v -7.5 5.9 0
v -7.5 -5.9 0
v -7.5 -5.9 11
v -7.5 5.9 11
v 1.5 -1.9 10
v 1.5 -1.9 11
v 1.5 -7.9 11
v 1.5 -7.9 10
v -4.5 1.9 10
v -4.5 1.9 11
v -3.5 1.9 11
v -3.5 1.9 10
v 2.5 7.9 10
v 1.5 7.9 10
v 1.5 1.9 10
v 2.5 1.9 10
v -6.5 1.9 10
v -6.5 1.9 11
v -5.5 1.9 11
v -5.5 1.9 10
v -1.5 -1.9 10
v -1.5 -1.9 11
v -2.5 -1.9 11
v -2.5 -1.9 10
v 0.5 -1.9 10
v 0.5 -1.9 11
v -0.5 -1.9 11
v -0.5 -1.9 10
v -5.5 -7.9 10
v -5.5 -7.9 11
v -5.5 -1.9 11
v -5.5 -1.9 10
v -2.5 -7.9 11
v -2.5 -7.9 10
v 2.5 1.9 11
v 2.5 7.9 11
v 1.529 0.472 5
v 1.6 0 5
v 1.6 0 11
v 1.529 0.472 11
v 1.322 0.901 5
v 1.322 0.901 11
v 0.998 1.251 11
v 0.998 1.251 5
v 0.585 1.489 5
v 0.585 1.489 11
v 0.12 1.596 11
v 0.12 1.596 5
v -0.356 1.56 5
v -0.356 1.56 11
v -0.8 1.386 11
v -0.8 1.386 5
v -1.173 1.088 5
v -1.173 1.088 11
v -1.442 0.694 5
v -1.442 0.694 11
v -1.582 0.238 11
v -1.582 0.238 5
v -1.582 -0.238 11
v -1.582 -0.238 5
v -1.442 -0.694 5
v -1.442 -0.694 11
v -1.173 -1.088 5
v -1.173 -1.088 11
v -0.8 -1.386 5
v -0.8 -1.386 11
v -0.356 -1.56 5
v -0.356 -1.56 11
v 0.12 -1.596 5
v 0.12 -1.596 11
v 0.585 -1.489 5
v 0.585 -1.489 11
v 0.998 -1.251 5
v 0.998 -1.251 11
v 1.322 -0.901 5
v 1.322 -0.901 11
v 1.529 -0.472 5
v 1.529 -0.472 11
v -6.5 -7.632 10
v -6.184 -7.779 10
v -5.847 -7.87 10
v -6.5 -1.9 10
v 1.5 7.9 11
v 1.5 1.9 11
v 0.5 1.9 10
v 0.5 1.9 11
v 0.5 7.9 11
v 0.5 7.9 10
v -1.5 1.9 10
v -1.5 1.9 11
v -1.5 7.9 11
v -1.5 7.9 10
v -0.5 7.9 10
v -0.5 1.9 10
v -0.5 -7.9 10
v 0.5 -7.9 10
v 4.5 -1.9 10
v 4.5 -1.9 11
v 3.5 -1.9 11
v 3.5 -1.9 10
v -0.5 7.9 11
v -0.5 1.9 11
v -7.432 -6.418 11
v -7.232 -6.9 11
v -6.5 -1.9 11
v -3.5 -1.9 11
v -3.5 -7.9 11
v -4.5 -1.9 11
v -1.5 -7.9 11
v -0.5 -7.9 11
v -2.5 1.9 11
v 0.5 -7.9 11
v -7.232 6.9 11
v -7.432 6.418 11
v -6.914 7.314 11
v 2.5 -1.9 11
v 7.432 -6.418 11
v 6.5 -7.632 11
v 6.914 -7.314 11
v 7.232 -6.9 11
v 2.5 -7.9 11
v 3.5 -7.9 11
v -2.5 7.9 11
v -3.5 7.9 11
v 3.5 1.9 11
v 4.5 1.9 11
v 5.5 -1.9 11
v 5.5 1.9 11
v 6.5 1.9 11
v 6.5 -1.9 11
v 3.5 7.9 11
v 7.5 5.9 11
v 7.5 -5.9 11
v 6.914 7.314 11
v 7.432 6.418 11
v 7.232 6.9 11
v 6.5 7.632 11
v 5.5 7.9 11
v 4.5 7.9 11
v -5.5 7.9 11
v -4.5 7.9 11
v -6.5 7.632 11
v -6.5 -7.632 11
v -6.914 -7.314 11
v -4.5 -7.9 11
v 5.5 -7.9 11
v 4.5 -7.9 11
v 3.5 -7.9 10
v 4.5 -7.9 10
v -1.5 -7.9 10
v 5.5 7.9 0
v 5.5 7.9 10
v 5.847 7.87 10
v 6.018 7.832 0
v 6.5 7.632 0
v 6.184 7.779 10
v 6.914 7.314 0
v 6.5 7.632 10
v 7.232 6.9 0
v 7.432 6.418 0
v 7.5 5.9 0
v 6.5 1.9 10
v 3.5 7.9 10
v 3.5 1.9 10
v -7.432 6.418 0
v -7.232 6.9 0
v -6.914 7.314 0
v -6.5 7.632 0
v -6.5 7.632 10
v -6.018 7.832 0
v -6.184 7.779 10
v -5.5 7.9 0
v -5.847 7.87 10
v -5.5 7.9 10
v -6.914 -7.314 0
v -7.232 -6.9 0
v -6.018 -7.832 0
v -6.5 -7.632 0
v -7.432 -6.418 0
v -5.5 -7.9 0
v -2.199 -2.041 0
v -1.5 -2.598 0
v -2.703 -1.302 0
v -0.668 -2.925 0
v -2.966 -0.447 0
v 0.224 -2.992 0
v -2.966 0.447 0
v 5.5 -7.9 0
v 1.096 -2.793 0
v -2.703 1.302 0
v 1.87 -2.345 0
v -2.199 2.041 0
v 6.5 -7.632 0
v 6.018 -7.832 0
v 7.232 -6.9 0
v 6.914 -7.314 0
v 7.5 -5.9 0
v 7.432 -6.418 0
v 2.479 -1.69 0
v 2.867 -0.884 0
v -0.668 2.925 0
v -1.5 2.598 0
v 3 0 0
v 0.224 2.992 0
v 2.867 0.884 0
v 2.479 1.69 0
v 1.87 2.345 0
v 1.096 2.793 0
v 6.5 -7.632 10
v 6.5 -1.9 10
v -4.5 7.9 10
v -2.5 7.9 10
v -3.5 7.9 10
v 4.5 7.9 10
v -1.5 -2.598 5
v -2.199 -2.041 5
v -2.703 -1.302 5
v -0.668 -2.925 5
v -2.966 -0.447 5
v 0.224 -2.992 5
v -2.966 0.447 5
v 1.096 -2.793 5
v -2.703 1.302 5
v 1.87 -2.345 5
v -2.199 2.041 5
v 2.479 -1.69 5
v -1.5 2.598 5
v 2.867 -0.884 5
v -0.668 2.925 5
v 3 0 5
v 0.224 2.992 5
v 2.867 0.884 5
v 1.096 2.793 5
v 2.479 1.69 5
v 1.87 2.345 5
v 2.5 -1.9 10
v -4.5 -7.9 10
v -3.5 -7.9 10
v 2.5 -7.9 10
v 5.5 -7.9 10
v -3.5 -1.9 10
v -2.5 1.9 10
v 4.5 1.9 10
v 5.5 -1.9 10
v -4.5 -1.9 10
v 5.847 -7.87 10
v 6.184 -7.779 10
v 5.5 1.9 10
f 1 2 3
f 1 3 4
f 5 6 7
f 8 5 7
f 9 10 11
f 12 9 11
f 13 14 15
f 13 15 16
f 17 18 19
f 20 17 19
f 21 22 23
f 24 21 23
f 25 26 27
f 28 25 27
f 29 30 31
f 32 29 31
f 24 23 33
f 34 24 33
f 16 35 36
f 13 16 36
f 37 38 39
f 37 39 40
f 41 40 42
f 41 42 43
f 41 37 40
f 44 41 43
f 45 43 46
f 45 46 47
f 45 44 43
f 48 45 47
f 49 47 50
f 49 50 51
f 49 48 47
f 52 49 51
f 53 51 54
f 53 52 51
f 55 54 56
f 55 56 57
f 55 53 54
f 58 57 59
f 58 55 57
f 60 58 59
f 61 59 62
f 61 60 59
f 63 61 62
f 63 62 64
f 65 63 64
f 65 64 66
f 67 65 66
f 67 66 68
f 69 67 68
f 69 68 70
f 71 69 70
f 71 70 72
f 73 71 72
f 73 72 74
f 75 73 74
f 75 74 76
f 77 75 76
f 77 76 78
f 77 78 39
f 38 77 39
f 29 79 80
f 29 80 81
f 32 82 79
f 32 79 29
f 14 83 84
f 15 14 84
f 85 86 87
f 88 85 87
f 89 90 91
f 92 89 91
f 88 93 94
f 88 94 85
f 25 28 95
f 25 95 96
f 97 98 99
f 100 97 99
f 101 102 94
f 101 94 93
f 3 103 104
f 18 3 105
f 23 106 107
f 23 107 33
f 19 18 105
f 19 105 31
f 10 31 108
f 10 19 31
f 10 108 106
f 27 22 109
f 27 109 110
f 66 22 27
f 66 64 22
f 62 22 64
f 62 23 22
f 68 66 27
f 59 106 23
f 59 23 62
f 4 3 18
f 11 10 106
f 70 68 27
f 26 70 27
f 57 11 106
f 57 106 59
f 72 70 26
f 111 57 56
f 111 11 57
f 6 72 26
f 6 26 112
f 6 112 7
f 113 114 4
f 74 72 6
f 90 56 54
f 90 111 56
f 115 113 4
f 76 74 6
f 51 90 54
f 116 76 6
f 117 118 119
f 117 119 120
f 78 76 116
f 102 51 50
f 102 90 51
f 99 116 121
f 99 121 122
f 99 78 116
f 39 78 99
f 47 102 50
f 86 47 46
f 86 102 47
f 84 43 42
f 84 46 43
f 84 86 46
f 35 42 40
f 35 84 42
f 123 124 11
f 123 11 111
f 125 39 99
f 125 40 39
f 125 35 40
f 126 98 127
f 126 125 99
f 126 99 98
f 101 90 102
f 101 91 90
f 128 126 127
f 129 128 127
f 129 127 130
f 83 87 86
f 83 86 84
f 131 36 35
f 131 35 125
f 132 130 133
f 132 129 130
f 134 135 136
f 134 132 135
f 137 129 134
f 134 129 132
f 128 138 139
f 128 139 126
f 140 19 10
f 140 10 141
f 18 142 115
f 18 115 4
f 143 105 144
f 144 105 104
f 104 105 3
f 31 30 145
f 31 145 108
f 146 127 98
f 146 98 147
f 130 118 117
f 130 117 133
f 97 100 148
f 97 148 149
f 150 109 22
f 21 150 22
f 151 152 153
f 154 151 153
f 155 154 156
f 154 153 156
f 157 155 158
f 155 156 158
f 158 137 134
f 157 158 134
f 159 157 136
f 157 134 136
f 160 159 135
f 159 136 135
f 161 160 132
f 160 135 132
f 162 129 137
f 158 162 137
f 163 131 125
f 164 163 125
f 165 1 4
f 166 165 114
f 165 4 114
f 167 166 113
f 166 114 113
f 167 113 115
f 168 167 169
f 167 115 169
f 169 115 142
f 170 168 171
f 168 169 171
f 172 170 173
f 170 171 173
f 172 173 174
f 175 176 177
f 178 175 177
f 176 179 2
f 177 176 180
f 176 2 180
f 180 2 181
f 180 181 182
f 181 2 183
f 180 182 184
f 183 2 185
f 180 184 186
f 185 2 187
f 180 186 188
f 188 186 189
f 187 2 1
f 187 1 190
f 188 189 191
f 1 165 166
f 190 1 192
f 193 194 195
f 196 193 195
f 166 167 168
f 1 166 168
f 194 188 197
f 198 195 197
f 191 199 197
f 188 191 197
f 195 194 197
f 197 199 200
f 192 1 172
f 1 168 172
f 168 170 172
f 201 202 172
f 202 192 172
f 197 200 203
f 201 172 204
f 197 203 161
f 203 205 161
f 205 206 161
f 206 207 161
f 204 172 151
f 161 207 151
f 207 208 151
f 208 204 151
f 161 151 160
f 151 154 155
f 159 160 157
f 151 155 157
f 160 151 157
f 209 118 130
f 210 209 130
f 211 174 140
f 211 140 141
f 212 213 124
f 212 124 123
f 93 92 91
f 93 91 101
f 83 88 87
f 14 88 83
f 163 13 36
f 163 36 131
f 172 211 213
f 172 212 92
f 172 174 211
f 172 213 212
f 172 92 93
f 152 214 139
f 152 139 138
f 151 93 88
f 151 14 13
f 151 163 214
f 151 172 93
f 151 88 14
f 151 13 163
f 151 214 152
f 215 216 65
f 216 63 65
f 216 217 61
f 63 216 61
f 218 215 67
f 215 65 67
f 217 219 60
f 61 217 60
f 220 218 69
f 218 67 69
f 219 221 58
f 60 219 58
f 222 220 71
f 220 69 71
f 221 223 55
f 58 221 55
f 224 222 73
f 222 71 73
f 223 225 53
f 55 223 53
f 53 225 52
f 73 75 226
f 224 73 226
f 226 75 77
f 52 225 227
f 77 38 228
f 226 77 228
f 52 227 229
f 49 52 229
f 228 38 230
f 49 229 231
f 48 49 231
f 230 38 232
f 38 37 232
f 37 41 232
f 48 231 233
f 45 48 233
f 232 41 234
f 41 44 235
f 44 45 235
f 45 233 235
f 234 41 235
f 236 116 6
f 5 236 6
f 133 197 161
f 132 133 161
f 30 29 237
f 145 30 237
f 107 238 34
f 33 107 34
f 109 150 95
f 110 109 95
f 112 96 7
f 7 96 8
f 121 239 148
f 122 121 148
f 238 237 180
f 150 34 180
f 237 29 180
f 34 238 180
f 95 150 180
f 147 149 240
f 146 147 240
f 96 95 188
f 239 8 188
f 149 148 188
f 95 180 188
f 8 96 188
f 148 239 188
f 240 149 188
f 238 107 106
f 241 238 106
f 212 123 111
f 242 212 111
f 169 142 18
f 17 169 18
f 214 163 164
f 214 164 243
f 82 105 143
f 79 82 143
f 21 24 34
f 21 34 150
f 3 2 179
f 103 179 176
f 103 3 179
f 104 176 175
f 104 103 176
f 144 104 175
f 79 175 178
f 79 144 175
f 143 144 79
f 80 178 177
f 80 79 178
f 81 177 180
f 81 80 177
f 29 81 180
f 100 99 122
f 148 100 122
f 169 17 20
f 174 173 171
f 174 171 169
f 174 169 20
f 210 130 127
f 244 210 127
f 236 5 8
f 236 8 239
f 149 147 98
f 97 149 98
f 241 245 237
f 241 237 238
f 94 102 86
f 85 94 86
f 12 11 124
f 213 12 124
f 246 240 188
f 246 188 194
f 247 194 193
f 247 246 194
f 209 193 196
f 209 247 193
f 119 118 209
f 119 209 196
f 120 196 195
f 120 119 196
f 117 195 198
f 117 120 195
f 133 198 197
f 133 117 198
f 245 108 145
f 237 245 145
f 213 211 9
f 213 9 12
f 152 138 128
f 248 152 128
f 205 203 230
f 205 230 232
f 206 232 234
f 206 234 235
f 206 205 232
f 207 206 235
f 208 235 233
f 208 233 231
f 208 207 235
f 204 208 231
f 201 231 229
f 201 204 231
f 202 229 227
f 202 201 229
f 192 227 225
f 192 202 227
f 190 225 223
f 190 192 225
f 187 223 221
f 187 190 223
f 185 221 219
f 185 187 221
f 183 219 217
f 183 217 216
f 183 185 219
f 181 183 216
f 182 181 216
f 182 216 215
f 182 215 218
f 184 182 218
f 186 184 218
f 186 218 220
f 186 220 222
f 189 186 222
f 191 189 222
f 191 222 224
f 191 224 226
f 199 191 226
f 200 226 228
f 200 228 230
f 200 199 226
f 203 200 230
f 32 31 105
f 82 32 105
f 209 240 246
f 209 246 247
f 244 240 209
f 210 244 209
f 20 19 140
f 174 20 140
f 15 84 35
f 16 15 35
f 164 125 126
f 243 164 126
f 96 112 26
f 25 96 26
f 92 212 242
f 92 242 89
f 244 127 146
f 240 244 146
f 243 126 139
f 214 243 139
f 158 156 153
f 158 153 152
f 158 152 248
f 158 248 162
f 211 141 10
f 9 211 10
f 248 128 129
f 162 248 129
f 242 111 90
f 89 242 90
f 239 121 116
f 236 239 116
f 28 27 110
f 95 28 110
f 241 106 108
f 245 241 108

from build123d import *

# Parameters (mm, degrees)
F0_W     = 15
F0_H     = 15.8
F0_R     = 3
F0_R_2   = 1.6
F1_DEPTH = 11
F2_DEPTH = 5
F3_R     = 2
F4_W     = 0.5
F4_H     = 6
F5_DEPTH = 1


with BuildPart() as f1:
    # F0 (on Top) → F1 (new body)
    with BuildSketch(Plane.XY):
        Rectangle(F0_W, F0_H)
        Circle(F0_R, mode=Mode.SUBTRACT)
        Circle(F0_R)
        Circle(F0_R_2, mode=Mode.SUBTRACT)
    extrude(amount=F1_DEPTH)

    # F0 (on Top) → F2 (cut)
    with BuildSketch(Plane.XY):
        Circle(F0_R)
        Circle(F0_R_2, mode=Mode.SUBTRACT)
    extrude(amount=F2_DEPTH, mode=Mode.SUBTRACT)

    # F3
    f3_edges = [f1.edges().sort_by_distance(p)[0] for p in [
        (-7.5, 7.9, 5.5),
        (-7.5, -7.9, 5.5),
        (7.5, -7.9, 5.5),
        (7.5, 7.9, 5.5),
    ]]
    fillet(f3_edges, radius=F3_R)

    # F4 (on face) → F5 (cut)
    with BuildSketch(Plane.XY.offset(11)):
        with Locations((-0.25, 4.9)):
            Rectangle(F4_W, F4_H)
        with Locations((0.25, 4.9)):
            Rectangle(F4_W, F4_H)
        Polygon((2, 7.9), (1.5, 7.9), (1.5, 1.9), (2, 1.9), (2.5, 1.9), (2.5, 7.9), align=None)
        Polygon((4, 7.9), (3.5, 7.9), (3.5, 1.9), (4, 1.9), (4.5, 1.9), (4.5, 7.9), align=None)
        with BuildLine():
            ThreePointArc((6.5, 7.632051), (6.017638, 7.831852), (5.5, 7.9))
            Line((5.5, 7.9), (5.5, 1.9))
            Line((5.5, 1.9), (6, 1.9))
            Line((6, 1.9), (6.5, 1.9))
            Line((6.5, 1.9), (6.5, 7.632051))
        make_face()
        Polygon((-1.5, 1.9), (-1.5, 7.9), (-2, 7.9), (-2.5, 7.9), (-2.5, 1.9), (-2, 1.9), align=None)
        Polygon((-3.5, 1.9), (-3.5, 7.9), (-4, 7.9), (-4.5, 7.9), (-4.5, 1.9), (-4, 1.9), align=None)
        with BuildLine():
            Line((-5.5, 1.9), (-5.5, 7.9))
            ThreePointArc((-5.5, 7.9), (-6.017638, 7.831852), (-6.5, 7.632051))
            Line((-6.5, 7.632051), (-6.5, 1.9))
            Line((-6.5, 1.9), (-6, 1.9))
            Line((-6, 1.9), (-5.5, 1.9))
        make_face()
        with BuildLine():
            Line((-6.5, -1.9), (-6.5, -7.632051))
            ThreePointArc((-6.5, -7.632051), (-6.017638, -7.831852), (-5.5, -7.9))
            Line((-5.5, -7.9), (-5.5, -1.9))
            Line((-5.5, -1.9), (-6, -1.9))
            Line((-6, -1.9), (-6.5, -1.9))
        make_face()
        Polygon((-4.5, -1.9), (-4.5, -7.9), (-4, -7.9), (-3.5, -7.9), (-3.5, -1.9), (-4, -1.9), align=None)
        Polygon((-2.5, -1.9), (-2.5, -7.9), (-2, -7.9), (-1.5, -7.9), (-1.5, -1.9), (-2, -1.9), align=None)
        Polygon((0, -7.9), (0.5, -7.9), (0.5, -1.9), (0, -1.9), (-0.5, -1.9), (-0.5, -7.9), align=None)
        Polygon((2, -7.9), (2.5, -7.9), (2.5, -1.9), (2, -1.9), (1.5, -1.9), (1.5, -7.9), align=None)
        Polygon((4, -7.9), (4.5, -7.9), (4.5, -1.9), (4, -1.9), (3.5, -1.9), (3.5, -7.9), align=None)
        with BuildLine():
            ThreePointArc((5.5, -7.9), (6.017638, -7.831852), (6.5, -7.632051))
            Line((6.5, -7.632051), (6.5, -1.9))
            Line((6.5, -1.9), (6, -1.9))
            Line((6, -1.9), (5.5, -1.9))
            Line((5.5, -1.9), (5.5, -7.9))
        make_face()
    extrude(amount=-F5_DEPTH, mode=Mode.SUBTRACT)


solid = f1.part
